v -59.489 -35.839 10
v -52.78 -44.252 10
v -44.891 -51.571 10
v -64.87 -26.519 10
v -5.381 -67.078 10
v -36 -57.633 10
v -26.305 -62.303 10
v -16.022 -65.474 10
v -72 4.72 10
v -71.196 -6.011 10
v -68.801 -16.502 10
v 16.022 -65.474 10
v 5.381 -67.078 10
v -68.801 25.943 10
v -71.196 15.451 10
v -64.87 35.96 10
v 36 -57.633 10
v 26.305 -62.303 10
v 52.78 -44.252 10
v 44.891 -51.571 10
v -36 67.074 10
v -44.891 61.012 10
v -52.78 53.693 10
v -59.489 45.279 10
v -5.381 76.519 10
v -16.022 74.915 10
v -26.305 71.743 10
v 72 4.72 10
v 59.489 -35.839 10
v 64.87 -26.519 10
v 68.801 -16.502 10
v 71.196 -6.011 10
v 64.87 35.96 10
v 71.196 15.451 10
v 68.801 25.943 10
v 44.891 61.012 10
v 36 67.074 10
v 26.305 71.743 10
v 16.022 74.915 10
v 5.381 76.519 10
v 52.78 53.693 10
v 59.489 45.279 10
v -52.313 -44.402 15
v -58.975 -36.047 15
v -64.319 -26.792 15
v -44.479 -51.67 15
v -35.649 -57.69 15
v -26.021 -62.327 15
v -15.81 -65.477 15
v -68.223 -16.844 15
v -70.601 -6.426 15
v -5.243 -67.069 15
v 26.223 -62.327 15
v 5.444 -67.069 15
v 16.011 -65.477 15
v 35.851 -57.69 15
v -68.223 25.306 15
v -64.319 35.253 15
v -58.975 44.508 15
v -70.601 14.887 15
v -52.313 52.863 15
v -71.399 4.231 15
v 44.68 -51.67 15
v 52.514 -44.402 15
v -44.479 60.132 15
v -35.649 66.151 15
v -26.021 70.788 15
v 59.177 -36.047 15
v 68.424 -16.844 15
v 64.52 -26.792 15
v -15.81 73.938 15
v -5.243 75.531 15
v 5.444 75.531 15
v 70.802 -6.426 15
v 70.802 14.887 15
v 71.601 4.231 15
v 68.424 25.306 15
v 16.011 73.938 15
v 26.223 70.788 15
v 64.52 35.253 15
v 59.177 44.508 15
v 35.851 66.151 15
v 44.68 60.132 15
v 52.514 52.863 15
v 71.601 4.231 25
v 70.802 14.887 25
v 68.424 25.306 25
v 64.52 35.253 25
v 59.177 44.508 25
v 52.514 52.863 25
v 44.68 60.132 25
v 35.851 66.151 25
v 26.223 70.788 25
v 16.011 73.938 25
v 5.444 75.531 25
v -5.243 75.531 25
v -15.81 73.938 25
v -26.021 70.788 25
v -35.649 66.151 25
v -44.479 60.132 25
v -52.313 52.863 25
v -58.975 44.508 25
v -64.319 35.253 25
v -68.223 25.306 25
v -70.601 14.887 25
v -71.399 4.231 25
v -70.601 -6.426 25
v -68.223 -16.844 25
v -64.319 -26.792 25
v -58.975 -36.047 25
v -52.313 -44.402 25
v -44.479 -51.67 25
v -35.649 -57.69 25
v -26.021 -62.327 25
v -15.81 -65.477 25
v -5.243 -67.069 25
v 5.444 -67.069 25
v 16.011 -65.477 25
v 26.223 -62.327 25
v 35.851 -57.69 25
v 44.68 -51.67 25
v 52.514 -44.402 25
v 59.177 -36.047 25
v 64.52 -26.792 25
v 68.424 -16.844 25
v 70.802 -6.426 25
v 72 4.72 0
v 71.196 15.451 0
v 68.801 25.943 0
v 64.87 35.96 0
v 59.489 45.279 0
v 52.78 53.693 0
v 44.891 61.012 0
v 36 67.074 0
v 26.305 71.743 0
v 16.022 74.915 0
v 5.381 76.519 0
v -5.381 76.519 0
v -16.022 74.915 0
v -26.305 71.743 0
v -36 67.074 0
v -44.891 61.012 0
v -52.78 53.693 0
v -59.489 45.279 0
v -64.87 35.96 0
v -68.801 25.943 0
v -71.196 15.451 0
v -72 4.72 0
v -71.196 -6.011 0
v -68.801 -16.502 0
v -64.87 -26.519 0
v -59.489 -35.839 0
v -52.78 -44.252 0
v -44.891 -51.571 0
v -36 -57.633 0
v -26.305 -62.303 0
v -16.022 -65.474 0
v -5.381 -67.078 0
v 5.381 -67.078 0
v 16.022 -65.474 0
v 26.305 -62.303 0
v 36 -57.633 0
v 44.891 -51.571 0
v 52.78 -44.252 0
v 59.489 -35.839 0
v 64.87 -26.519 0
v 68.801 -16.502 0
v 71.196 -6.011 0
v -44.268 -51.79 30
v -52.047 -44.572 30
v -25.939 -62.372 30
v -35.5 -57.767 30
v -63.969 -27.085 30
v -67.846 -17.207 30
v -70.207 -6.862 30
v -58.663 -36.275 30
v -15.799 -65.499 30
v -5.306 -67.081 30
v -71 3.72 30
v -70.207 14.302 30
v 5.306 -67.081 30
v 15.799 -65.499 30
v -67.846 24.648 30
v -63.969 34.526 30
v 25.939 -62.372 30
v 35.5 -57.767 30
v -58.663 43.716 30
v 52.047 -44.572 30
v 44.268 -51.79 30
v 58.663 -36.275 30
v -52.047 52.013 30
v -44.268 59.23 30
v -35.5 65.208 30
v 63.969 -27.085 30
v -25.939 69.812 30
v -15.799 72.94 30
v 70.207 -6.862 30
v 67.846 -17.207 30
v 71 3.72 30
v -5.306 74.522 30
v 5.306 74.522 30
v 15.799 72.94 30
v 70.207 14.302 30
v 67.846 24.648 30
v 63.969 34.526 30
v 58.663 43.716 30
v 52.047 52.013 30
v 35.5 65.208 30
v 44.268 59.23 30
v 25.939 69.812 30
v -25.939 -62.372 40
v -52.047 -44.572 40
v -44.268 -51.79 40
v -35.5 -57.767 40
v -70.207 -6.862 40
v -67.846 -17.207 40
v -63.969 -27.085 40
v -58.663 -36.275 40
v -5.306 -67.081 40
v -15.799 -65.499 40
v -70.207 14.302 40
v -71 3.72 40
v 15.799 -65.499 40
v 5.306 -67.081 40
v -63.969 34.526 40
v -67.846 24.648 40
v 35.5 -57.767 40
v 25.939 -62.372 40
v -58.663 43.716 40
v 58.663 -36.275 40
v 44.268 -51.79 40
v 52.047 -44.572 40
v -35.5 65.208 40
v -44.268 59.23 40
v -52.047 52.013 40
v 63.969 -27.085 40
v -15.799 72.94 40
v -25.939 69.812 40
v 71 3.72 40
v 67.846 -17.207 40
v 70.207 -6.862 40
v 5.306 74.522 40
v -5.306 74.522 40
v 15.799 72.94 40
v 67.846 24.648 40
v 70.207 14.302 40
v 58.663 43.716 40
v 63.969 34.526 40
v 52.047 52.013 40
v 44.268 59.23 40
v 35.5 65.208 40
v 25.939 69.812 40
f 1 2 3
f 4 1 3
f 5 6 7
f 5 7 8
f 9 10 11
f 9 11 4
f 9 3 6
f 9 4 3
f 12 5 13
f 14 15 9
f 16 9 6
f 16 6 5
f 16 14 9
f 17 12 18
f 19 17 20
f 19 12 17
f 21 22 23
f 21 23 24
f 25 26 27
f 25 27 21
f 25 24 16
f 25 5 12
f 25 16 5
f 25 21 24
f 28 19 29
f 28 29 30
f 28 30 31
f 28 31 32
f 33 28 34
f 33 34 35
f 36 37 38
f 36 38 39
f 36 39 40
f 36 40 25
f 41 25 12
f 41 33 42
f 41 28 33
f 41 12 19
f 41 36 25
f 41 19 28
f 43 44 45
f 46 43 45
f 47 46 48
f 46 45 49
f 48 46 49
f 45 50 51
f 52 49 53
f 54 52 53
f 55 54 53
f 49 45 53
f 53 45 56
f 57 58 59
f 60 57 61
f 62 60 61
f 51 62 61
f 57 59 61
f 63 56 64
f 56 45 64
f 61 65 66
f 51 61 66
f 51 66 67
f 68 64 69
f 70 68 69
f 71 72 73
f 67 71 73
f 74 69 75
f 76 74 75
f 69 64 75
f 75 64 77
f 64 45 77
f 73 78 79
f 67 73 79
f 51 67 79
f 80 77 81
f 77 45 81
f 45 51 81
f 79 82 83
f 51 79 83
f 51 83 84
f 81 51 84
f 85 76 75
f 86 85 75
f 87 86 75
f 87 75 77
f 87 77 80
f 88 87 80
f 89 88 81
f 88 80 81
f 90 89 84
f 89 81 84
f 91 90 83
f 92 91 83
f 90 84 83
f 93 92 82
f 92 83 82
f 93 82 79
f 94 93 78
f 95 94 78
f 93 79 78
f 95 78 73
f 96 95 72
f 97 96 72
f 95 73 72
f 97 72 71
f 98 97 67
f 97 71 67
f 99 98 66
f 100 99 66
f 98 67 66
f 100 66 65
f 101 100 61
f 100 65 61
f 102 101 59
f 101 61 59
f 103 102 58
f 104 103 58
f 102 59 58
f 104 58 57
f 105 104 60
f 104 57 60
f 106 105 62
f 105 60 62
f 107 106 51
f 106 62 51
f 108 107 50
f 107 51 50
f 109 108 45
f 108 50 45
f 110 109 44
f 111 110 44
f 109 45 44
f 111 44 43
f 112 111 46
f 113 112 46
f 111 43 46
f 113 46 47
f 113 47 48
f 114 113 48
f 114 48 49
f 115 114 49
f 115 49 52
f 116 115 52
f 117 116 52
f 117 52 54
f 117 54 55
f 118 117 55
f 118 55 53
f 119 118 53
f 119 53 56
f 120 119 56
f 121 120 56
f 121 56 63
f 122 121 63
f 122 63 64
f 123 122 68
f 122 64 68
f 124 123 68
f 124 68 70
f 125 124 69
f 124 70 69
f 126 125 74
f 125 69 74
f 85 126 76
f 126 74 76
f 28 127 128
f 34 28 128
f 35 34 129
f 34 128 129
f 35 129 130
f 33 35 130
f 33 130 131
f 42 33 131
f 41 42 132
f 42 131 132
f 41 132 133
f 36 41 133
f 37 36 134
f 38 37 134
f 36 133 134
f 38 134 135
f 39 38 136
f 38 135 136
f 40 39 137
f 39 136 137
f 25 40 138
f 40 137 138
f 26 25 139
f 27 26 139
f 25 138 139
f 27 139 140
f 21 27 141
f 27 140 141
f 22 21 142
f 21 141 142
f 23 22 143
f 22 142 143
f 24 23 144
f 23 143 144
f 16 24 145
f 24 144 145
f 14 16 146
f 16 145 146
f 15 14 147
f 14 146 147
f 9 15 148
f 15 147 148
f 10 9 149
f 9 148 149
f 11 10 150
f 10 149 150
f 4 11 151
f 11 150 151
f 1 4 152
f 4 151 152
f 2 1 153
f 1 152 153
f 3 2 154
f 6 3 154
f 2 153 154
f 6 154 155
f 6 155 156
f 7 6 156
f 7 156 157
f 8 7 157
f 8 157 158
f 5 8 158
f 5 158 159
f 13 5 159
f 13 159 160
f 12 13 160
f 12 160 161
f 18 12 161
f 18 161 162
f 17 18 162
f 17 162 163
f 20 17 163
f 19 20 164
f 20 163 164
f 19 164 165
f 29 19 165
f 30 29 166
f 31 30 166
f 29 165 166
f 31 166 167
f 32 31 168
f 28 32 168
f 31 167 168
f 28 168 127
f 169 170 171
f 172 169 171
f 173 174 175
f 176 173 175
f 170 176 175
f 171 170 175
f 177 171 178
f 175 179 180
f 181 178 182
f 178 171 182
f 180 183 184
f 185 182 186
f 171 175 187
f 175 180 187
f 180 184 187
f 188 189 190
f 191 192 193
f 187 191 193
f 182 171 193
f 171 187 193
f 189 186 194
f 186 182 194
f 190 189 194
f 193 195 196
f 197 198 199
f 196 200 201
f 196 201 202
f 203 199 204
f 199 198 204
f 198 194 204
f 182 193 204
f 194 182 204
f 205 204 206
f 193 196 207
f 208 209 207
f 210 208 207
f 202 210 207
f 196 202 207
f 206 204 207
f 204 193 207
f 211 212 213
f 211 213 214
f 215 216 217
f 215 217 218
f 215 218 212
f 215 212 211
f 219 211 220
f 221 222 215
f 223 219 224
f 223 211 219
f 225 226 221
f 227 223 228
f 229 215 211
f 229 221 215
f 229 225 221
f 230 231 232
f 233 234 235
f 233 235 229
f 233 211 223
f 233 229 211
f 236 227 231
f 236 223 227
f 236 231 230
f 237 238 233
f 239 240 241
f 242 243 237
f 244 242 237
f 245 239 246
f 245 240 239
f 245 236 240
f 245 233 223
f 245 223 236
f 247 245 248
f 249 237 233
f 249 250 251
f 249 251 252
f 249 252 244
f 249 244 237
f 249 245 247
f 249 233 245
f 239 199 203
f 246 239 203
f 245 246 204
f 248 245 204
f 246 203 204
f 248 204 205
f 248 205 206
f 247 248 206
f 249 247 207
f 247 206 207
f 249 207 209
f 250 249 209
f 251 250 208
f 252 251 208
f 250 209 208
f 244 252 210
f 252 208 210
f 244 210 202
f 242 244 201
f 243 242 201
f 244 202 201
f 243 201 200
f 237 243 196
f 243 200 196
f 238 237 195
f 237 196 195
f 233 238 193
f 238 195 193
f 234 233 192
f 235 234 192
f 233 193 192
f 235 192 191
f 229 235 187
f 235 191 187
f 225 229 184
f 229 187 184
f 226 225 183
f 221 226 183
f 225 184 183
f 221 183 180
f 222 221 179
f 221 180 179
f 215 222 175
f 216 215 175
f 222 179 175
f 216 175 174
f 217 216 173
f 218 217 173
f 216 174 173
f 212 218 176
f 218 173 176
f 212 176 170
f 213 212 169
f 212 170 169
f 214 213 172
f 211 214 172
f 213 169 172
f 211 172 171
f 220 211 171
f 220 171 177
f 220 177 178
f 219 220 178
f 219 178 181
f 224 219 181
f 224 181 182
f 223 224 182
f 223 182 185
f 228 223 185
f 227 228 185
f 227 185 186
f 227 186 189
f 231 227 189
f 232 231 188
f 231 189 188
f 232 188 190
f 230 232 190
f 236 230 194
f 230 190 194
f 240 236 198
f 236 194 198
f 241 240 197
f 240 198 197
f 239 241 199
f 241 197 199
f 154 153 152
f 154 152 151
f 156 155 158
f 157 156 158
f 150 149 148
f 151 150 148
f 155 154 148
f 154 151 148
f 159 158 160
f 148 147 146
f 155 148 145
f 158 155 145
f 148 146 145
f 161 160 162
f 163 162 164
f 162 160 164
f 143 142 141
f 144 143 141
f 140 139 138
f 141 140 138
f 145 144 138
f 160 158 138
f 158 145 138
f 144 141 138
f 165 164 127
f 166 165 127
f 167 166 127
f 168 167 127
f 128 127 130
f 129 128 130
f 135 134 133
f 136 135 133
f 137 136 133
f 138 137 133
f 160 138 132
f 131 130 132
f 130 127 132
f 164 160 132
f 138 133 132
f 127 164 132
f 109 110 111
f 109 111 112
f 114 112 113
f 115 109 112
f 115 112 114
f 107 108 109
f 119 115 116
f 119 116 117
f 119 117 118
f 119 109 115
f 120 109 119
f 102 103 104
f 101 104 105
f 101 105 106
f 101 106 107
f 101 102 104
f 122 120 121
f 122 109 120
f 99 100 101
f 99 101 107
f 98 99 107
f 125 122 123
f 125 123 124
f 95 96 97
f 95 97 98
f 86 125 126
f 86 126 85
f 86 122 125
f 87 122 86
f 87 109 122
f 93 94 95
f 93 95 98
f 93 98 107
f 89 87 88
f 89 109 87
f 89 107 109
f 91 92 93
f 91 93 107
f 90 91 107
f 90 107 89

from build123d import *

# Parameters (mm, degrees)
SKETCH_4_R      = 72
EXTRUDE_4_DEPTH = 10
EXTRUDE_START   = 15
SKETCH_4_4_R    = 71.5
EXTRUDE_6_DEPTH = 10
EXTRUDE_START_2 = 30
SKETCH_4_5_R    = 71
EXTRUDE_7_DEPTH = 10


with BuildPart() as part:
    # 草圖4 → 填料-伸長4 (new body)
    with BuildSketch(Plane.XY):
        with Locations((0, 4.720385608)):
            Circle(SKETCH_4_R)
    extrude(amount=EXTRUDE_4_DEPTH)


with BuildPart() as body_2:
    # 草圖4<4> → 填料-伸長6 (new body)
    with BuildSketch(Plane.XY.offset(EXTRUDE_START)):
        with Locations((0.100658917, 4.230622622)):
            Circle(SKETCH_4_4_R)
    extrude(amount=EXTRUDE_6_DEPTH)


with BuildPart() as body_3:
    # 草圖4<5> → 填料-伸長7 (new body)
    with BuildSketch(Plane.XY.offset(EXTRUDE_START_2)):
        with Locations((0, 3.720385608)):
            Circle(SKETCH_4_5_R)
    extrude(amount=EXTRUDE_7_DEPTH)


solid = Compound([part.part, body_2.part, body_3.part])
